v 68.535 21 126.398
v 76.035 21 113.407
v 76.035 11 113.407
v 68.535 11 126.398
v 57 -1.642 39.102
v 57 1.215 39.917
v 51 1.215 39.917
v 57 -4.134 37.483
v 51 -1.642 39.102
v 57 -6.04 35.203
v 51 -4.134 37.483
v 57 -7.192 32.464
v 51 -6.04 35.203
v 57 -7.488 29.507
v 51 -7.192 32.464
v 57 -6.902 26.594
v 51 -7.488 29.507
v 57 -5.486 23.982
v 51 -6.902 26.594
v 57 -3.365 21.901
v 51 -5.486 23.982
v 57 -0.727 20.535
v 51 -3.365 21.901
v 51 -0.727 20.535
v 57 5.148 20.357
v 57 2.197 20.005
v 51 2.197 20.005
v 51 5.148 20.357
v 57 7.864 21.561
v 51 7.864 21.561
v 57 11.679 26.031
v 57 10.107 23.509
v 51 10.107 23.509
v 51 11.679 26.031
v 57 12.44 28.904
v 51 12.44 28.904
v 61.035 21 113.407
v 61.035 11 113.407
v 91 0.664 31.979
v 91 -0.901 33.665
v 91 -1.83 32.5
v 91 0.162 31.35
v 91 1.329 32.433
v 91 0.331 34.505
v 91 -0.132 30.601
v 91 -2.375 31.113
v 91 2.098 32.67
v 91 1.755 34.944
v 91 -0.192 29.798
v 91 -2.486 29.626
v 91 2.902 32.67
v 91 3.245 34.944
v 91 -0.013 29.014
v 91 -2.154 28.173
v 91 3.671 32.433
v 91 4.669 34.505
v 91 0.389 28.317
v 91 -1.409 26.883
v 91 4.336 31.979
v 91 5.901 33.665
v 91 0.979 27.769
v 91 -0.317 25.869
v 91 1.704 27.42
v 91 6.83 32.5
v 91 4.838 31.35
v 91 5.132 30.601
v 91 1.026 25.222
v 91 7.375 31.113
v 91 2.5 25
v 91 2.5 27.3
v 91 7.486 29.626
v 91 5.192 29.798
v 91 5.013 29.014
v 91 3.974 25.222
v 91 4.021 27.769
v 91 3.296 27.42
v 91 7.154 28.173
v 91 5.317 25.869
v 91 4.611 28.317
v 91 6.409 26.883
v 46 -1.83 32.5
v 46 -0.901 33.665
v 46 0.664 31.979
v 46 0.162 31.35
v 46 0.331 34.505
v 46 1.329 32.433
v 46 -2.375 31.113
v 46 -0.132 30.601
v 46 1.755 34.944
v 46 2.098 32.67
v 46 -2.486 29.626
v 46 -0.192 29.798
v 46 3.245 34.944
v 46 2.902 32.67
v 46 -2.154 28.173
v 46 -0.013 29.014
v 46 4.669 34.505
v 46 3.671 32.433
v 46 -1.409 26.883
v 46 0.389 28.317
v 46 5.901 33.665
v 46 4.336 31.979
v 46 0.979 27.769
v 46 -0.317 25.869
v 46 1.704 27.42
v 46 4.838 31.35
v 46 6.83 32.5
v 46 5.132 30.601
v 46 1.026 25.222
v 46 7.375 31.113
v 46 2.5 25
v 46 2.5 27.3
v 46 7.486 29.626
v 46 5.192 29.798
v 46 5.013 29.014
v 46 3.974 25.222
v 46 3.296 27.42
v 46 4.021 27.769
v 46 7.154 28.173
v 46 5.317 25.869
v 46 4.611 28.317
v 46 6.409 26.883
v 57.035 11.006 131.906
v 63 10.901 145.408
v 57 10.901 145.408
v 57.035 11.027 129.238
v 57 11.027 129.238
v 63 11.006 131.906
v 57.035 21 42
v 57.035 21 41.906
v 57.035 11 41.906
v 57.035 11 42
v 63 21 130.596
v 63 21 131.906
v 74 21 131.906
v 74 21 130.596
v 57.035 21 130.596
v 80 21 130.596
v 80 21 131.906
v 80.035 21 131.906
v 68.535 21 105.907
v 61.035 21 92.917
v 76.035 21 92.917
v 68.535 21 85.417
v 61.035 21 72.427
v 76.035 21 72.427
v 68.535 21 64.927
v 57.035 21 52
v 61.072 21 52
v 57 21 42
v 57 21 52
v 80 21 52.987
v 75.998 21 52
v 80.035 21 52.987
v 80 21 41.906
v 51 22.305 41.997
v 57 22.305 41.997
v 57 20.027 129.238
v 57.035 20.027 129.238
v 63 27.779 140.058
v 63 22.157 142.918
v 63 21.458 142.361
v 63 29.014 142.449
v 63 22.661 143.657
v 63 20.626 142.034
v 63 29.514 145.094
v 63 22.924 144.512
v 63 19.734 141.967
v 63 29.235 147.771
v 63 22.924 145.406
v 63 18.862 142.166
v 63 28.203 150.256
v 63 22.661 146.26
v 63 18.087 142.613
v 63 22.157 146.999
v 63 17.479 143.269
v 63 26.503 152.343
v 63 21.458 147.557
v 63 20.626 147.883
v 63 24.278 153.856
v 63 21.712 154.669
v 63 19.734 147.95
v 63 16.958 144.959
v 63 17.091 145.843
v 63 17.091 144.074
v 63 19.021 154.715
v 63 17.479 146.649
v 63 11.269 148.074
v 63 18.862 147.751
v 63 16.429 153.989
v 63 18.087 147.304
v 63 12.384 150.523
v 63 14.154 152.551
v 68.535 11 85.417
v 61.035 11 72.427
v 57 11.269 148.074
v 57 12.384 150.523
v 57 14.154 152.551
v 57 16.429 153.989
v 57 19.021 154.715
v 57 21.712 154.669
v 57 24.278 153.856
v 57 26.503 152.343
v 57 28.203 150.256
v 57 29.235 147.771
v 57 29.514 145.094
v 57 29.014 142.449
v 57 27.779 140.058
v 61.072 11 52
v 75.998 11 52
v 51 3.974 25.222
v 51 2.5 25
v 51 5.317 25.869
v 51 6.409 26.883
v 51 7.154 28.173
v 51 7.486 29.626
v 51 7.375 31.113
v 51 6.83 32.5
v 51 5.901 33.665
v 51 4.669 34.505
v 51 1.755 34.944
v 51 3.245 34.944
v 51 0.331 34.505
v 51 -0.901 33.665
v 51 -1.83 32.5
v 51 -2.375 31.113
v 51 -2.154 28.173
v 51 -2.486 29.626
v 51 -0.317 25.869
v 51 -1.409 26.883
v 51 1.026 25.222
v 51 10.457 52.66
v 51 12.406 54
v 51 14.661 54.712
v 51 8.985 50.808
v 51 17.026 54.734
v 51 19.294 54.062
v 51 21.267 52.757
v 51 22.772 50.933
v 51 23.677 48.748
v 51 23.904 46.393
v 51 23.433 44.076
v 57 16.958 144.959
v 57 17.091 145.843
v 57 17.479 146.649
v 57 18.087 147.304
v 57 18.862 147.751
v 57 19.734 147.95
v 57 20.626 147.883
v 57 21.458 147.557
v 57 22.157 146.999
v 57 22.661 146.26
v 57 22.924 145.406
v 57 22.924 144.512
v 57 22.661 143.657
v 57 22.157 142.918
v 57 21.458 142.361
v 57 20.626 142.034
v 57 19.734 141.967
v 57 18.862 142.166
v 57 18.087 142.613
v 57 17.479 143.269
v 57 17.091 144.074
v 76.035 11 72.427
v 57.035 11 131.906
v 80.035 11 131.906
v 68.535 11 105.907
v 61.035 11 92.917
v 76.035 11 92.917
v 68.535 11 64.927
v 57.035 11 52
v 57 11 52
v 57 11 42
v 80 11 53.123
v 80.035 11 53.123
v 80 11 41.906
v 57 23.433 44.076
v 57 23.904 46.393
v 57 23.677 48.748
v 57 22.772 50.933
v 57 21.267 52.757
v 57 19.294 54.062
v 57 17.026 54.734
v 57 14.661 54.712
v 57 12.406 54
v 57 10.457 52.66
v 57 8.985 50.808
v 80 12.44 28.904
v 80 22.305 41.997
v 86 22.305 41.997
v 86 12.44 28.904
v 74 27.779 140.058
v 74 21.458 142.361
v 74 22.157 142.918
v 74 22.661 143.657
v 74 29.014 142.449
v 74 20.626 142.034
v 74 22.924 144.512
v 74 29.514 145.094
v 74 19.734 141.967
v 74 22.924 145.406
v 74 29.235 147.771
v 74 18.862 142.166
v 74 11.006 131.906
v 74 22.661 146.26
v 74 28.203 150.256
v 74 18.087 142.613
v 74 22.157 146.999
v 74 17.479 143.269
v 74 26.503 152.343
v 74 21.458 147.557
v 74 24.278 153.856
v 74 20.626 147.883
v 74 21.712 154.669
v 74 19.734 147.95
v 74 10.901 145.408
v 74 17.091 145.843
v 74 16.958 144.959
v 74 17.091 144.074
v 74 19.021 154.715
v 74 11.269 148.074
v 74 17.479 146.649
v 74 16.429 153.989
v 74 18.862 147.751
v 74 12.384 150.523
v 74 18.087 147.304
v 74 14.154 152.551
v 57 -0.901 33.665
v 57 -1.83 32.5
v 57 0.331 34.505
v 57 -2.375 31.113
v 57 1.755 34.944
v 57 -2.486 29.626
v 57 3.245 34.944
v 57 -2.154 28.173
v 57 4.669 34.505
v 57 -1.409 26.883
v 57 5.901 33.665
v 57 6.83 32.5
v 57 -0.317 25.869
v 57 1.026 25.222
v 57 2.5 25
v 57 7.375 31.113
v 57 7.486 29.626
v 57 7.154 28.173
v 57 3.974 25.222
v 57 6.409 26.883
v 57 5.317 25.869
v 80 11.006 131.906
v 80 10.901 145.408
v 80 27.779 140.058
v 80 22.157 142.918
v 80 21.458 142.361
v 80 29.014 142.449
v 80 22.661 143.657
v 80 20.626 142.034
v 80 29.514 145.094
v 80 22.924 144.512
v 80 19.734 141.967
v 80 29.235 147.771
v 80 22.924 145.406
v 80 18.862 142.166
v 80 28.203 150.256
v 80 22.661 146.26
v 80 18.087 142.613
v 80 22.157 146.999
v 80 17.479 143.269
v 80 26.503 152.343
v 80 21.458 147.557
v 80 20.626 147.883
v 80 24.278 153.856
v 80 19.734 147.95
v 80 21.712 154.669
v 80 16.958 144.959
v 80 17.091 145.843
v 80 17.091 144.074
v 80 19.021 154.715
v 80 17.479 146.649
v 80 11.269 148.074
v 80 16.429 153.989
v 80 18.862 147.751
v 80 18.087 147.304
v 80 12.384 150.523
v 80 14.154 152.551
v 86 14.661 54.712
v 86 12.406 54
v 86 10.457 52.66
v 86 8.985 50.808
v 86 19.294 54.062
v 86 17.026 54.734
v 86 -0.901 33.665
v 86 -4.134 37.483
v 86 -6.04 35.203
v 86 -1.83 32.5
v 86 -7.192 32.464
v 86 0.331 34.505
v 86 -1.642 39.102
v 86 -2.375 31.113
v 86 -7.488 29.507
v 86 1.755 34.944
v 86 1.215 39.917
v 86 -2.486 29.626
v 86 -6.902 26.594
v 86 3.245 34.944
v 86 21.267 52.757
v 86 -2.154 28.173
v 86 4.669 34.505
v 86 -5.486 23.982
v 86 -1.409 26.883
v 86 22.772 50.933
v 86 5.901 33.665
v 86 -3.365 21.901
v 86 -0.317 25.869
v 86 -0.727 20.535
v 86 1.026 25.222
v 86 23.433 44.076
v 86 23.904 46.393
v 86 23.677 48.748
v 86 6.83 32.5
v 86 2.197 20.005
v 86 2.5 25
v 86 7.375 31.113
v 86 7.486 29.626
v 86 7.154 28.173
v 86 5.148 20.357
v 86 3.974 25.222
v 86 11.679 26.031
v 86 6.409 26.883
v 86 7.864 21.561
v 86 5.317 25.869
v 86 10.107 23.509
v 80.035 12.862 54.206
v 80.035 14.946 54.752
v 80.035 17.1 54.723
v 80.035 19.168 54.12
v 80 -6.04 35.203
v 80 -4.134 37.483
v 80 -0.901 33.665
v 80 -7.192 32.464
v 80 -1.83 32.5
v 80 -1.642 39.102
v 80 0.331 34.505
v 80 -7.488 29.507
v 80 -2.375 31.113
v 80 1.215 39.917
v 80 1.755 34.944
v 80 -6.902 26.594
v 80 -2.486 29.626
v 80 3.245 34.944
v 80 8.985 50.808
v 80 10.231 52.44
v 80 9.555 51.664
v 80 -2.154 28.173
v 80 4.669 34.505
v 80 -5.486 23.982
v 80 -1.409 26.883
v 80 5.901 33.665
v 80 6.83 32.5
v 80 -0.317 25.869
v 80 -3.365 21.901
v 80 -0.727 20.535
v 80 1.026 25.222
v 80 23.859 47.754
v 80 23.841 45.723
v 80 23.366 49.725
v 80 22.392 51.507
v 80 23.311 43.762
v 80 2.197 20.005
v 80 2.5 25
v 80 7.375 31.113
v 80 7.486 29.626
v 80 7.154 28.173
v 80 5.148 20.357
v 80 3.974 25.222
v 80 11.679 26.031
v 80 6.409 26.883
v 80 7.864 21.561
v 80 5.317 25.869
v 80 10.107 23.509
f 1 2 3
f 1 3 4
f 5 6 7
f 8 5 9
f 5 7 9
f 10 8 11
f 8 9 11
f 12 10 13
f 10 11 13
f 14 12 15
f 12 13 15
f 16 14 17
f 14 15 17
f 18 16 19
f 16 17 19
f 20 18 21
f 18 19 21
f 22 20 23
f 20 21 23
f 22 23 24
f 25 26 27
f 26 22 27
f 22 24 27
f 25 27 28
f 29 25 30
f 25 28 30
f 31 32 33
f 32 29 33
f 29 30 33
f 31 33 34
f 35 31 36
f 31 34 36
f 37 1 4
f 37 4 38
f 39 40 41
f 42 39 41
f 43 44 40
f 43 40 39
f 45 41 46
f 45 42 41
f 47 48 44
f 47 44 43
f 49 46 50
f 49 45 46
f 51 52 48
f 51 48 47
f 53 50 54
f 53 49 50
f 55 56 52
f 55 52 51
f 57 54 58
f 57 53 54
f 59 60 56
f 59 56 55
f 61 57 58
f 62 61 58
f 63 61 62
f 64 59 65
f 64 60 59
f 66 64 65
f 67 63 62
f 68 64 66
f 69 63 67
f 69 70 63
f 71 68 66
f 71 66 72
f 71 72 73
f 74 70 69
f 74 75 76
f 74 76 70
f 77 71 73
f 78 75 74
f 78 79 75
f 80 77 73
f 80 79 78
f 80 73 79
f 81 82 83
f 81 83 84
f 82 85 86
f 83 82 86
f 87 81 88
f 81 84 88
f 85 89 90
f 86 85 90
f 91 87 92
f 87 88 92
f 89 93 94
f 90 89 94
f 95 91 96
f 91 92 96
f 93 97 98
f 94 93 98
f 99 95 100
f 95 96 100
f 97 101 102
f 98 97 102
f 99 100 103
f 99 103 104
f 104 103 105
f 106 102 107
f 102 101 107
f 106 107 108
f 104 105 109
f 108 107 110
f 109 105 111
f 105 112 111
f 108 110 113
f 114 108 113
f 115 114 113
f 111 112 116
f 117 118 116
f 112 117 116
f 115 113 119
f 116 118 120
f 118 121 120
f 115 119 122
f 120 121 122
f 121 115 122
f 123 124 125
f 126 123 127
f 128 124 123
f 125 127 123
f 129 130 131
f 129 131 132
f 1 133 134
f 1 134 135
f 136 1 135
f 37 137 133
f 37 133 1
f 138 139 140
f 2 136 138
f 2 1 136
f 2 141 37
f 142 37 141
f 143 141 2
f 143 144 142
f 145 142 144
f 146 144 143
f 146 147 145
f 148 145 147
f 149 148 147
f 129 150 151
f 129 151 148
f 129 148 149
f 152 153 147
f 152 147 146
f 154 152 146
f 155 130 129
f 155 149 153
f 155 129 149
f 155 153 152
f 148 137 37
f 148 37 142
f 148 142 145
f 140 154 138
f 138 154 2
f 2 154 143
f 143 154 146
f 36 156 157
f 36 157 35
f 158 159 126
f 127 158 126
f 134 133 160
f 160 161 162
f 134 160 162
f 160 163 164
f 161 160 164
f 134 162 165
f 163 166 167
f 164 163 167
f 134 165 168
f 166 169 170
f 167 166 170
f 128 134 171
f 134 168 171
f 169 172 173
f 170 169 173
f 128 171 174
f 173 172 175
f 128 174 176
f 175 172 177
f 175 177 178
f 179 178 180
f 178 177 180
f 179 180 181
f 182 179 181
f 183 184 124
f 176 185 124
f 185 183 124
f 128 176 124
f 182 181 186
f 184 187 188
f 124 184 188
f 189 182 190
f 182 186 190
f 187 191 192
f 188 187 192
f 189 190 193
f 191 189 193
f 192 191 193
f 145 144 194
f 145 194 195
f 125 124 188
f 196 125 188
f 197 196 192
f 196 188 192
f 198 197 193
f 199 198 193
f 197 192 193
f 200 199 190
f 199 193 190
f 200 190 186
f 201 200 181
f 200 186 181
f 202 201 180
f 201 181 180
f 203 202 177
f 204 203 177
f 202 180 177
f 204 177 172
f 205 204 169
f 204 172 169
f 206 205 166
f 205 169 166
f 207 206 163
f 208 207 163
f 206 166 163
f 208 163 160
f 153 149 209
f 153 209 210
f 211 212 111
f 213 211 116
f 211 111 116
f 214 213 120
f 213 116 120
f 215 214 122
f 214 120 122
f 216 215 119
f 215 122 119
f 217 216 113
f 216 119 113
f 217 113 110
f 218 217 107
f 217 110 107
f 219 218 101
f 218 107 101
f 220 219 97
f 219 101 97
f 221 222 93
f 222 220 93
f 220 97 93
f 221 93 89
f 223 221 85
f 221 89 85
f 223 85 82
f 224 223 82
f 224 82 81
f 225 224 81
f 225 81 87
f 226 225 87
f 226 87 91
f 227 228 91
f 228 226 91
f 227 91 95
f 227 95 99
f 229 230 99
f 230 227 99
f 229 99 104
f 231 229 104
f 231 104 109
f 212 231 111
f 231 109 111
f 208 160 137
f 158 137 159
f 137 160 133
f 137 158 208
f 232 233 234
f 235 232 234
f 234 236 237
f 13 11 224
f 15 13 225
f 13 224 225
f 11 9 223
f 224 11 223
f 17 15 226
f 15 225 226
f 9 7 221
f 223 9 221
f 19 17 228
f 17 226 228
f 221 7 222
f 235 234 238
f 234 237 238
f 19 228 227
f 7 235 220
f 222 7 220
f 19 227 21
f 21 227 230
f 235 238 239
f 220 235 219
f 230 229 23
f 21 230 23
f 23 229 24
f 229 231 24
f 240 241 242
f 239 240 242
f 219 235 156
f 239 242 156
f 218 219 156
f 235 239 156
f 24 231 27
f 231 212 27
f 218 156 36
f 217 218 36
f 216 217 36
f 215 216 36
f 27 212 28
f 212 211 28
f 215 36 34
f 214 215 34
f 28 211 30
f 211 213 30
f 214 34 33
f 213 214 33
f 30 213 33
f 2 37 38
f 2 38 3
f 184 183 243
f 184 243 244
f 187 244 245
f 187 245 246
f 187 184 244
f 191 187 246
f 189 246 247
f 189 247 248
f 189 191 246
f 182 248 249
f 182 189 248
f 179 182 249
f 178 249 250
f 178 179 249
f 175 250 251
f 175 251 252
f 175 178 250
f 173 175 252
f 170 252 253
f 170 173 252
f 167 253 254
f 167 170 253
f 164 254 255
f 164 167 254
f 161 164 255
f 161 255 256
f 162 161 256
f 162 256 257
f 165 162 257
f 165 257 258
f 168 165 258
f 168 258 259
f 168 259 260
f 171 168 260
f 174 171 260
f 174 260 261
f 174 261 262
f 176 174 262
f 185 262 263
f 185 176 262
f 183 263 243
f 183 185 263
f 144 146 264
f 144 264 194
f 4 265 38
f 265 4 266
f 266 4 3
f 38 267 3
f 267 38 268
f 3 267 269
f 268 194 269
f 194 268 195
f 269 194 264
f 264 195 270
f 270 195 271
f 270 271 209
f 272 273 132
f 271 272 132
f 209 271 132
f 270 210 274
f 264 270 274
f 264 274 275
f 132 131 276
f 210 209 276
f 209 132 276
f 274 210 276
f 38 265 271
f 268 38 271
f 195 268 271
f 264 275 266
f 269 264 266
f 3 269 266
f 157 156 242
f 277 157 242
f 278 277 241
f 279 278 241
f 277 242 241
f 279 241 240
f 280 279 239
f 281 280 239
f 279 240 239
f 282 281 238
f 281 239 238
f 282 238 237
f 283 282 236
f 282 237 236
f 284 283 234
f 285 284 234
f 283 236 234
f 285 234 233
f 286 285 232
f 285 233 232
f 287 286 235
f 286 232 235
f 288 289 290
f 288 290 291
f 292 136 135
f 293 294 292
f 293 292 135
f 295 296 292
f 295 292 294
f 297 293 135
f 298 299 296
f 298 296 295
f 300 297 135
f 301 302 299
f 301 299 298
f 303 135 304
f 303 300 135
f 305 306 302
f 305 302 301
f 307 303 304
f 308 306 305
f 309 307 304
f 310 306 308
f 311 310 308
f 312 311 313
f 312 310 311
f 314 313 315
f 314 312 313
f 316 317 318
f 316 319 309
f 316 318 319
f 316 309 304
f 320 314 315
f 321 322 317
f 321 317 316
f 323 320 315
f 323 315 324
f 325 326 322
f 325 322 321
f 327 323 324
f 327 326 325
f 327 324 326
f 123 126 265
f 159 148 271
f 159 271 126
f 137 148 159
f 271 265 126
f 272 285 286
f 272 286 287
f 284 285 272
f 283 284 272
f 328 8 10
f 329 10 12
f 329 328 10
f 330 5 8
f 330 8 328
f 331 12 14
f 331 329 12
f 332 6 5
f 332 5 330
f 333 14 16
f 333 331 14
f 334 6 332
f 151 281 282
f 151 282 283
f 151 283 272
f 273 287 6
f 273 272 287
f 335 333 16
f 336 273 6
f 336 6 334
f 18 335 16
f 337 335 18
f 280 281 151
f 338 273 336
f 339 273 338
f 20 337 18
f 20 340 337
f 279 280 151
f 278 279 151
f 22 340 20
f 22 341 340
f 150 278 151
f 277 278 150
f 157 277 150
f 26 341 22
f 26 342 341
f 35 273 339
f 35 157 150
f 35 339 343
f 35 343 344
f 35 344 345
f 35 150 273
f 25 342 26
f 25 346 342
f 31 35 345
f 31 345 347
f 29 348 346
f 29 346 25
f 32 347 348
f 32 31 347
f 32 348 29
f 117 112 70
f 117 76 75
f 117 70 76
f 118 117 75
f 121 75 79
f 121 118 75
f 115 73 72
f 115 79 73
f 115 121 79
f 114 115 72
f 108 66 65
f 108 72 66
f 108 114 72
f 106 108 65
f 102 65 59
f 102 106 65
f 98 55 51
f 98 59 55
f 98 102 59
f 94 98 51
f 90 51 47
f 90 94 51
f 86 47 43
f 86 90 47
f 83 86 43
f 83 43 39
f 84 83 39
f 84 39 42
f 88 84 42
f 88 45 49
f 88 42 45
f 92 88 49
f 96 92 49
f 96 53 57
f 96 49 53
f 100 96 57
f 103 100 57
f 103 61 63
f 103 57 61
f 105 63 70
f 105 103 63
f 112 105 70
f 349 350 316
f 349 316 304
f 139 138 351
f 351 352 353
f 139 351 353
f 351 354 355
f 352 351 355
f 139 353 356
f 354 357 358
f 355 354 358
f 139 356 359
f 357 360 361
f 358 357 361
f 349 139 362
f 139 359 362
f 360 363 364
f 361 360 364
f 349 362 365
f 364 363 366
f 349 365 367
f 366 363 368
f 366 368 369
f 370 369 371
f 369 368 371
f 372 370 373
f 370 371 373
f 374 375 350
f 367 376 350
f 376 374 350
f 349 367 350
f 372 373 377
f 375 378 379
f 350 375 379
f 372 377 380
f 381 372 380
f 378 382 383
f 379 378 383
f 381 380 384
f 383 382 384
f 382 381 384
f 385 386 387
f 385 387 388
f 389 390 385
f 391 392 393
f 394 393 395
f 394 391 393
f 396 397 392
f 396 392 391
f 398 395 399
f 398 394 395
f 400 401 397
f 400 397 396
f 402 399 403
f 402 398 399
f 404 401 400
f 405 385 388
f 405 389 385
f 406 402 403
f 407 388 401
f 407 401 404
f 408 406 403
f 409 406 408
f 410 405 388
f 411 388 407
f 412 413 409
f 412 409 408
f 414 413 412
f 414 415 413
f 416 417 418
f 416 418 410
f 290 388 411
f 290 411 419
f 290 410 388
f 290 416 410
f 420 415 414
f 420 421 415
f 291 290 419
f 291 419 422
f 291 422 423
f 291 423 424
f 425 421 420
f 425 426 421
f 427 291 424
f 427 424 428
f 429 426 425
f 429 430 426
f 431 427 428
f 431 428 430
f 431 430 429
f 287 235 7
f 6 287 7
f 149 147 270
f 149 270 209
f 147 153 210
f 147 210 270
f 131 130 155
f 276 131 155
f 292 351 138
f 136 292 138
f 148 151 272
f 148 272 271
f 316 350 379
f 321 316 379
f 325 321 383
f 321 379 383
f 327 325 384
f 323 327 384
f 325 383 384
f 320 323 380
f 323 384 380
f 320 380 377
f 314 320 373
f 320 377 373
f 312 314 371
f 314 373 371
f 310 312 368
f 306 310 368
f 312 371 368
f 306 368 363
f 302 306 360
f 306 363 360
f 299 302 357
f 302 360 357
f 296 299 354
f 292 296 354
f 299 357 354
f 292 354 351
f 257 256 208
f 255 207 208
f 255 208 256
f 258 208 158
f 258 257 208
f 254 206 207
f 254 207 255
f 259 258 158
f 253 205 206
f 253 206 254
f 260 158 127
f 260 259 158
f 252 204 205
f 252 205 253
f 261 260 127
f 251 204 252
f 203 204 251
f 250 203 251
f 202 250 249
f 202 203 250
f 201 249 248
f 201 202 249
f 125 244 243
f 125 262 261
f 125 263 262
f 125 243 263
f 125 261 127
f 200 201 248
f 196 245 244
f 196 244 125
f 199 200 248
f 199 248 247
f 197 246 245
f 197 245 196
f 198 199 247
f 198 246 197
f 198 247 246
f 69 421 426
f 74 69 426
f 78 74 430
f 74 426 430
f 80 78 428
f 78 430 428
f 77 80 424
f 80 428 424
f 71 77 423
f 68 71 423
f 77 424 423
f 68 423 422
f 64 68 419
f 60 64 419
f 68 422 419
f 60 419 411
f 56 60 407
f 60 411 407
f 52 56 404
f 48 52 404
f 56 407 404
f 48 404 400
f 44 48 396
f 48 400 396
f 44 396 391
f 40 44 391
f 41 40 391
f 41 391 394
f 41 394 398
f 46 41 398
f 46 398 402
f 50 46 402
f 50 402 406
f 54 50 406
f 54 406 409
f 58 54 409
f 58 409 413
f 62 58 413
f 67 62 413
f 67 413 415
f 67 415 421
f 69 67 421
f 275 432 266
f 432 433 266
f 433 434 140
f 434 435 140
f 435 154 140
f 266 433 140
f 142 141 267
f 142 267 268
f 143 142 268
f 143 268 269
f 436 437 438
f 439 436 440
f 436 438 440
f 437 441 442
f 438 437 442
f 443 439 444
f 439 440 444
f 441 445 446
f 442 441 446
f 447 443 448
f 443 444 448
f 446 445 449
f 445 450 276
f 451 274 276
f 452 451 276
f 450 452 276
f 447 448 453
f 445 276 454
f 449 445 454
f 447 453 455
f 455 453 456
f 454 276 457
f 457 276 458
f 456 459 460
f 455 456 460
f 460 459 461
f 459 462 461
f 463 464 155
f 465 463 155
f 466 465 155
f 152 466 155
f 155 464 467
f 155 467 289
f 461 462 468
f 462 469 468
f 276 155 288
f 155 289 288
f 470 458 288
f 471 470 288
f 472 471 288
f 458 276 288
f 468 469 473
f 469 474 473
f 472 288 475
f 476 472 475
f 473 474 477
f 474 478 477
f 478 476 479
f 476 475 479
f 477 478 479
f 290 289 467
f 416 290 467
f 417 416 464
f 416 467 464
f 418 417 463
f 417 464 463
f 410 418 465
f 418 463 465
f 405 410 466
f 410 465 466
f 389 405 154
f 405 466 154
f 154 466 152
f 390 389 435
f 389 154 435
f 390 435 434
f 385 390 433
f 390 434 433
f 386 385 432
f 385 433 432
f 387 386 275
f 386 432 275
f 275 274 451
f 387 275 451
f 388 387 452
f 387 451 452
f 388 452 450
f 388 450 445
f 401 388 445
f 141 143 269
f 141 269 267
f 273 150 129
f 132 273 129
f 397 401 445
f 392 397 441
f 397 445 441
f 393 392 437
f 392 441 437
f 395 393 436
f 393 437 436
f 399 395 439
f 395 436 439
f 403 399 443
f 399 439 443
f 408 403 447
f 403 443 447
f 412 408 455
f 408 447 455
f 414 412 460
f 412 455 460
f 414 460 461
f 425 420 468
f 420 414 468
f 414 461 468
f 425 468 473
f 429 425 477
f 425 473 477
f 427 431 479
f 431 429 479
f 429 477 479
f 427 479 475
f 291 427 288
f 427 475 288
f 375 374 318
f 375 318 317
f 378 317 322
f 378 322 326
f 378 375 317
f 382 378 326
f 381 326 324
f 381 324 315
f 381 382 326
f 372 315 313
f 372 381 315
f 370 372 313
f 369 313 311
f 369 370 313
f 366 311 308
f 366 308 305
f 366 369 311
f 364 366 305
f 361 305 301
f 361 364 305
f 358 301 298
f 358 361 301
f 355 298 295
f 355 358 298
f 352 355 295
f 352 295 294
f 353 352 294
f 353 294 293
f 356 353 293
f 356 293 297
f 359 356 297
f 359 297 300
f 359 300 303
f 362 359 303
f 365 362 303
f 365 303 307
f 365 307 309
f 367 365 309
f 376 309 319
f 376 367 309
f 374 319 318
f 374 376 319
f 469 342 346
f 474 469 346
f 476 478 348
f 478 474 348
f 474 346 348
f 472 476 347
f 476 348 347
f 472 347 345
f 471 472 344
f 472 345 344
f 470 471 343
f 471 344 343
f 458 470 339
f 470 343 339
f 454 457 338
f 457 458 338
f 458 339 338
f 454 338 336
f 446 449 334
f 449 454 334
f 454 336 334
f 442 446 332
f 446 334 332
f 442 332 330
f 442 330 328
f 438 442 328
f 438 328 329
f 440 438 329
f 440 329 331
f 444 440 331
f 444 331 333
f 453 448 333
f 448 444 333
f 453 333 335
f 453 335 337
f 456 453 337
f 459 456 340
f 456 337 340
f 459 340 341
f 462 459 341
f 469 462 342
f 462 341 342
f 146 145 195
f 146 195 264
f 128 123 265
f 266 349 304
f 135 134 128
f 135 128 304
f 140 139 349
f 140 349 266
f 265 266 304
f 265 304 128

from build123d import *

# Parameters (mm, degrees)
SKETCH017_R       = 3
EXTRUDE016_DEPTH  = 6
SKETCH016_W       = 23
SKETCH016_H       = 90
EXTRUDE015_DEPTH  = 10
CYLINDER018_R     = 3
CYLINDER018_DEPTH = 25
CYLINDER013_R     = 7
CYLINDER013_DEPTH = 30
CYLINDER012_R     = 10
CYLINDER012_DEPTH = 6
EXTRUDE001_DEPTH  = 6
BOX022_W          = 23
BOX022_H          = 10
BOX022_DEPTH      = 10
CYLINDER021_R     = 2.7
CYLINDER021_DEPTH = 50
CYLINDER020_R     = 5
CYLINDER020_DEPTH = 45


with BuildPart() as union_brazo_central002:
    # Sketch017 → Extrude016 (new body)
    with BuildSketch(Plane(origin=(0, 0, 0), x_dir=(0, -1, 0), z_dir=(-1, 0, 0))):
        with BuildLine():
            ThreePointArc((-10.900695, 145.407872), (-23.024313, 154.355924), (-27.779278, 140.057671))
            Line((-27.779278, 140.057671), (-20.026942, 129.238365))
            Line((-20.026942, 129.238365), (-11.026942, 129.238365))
            Line((-10.900695, 145.407872), (-11.026942, 129.238365))
        make_face()
        with Locations((-19.957954, 144.958669)):
            Circle(SKETCH017_R, mode=Mode.SUBTRACT)
    extrude(amount=EXTRUDE016_DEPTH)


with BuildPart() as union_brazo_central002_1:
    # Extrude016 placement: moved
    add(union_brazo_central002.part.moved(Location((63, 0, 0))))


with BuildPart() as palo_central:
    # Sketch016 → Extrude015 (new body)
    with BuildSketch(Plane.XZ):
        with Locations((68.535034, 86.905613)):
            Rectangle(SKETCH016_W, SKETCH016_H)
        Polygon((68.535034, 64.926588), (61.035034, 51.936207), (76.035034, 51.936207), align=None, mode=Mode.SUBTRACT)
        Polygon((68.535034, 85.416969), (61.035034, 72.426588), (76.035034, 72.426588), align=None, mode=Mode.SUBTRACT)
        Polygon((68.535034, 105.90735), (61.035034, 92.916969), (76.035034, 92.916969), align=None, mode=Mode.SUBTRACT)
        Polygon((68.535034, 126.397731), (61.035034, 113.40735), (76.035034, 113.40735), align=None, mode=Mode.SUBTRACT)
    extrude(amount=EXTRUDE015_DEPTH)


with BuildPart() as palo_central_1:
    # Extrude015 placement: moved
    add(palo_central.part.moved(Location((0, 21, 0))))


with BuildPart() as rotor008:
    # Cylinder018 → Cylinder018 (new body)
    with BuildSketch(Plane(origin=(40, 2.5, 30), x_dir=(0, 0, -1), z_dir=(1, 0, 0))):
        Circle(CYLINDER018_R)
    extrude(amount=CYLINDER018_DEPTH)


with BuildPart() as rotor003:
    # Cylinder013 → Cylinder013 (new body)
    with BuildSketch(Plane(origin=(63, 2.5, 30), x_dir=(0, 0, -1), z_dir=(1, 0, 0))):
        Circle(CYLINDER013_R)
    extrude(amount=CYLINDER013_DEPTH)


with BuildPart() as union_motor_izq:
    # Cylinder012 → Cylinder012 (new body)
    with BuildSketch(Plane(origin=(54, 2.5, 30), x_dir=(0, 0, -1), z_dir=(1, 0, 0))):
        Circle(CYLINDER012_R)
    extrude(amount=CYLINDER012_DEPTH)

    # Cut008: cut Rotor003
    add(rotor003.part, mode=Mode.SUBTRACT)

    # Cut011: cut Rotor008
    add(rotor008.part, mode=Mode.SUBTRACT)


with BuildPart() as union_motor_centro:
    # Sketch001 → Extrude001 (new body)
    with BuildSketch(Plane.YZ):
        with BuildLine():
            ThreePointArc((22.654639, 41.99706), (20.679007, 53.483206), (9.335322, 50.808228))
            Line((9.335322, 50.808228), (1.552816, 39.899855))
            ThreePointArc((12.665635, 28.738862), (9.310536, 36.511168), (1.552816, 39.899855))
            Line((22.654639, 41.99706), (12.665635, 28.738862))
        make_face()
    extrude(amount=EXTRUDE001_DEPTH)


with BuildPart() as union_motor_centro_1:
    # Extrude001 placement: moved
    add(union_motor_centro.part.moved(Location((54, -0.35, 0))))

    # Fusion013: union Union motor izq
    add(union_motor_izq.part)


with BuildPart() as union_motor_centro001:
    # Link016 base: copy of Union motor centro
    add(union_motor_centro_1.part)


with BuildPart() as union_motor_centro001_1:
    # Link016 placement: moved
    add(union_motor_centro001.part.moved(Location((28.999998, -3e-06, 0))))


with BuildPart() as puente_centro:
    # Box022 → Box022 (new body)
    with BuildSketch(Plane(origin=(60, 11, 42), x_dir=(1, 0, 0), z_dir=(0, 0, 1))):
        with Locations((11.5, 5)):
            Rectangle(BOX022_W, BOX022_H)
    extrude(amount=BOX022_DEPTH)


with BuildPart() as hueco_rotor:
    # Cylinder021 → Cylinder021 (new body)
    with BuildSketch(Plane(origin=(37, 2.5, 30), x_dir=(0, 0, -1), z_dir=(1, 0, 0))):
        Circle(CYLINDER021_R)
    extrude(amount=CYLINDER021_DEPTH)


with BuildPart() as union_rotor_brazo:
    # Cylinder020 → Cylinder020 (new body)
    with BuildSketch(Plane(origin=(40, 2.5, 30), x_dir=(0, 0, -1), z_dir=(1, 0, 0))):
        Circle(CYLINDER020_R)
    extrude(amount=CYLINDER020_DEPTH)

    # Cut012: cut hueco rotor
    add(hueco_rotor.part, mode=Mode.SUBTRACT)


with BuildPart() as union_rotor_brazo_1:
    # Cut012 placement: moved
    add(union_rotor_brazo.part.moved(Location((9, 0, 0))))

    # Fusion014: union Union motor centro001, Union motor centro, Puente centro
    add(union_motor_centro001_1.part)
    add(union_motor_centro_1.part)
    add(puente_centro.part)


with BuildPart() as union_rotor_brazo_2:
    # Fusion014 placement: moved
    add(union_rotor_brazo_1.part.moved(Location((-3, 0, 0))))


with BuildPart() as brazo_central_v2:
    # Link018 base: copy of Union brazo central002
    add(union_brazo_central002_1.part)


with BuildPart() as brazo_central_v2_1:
    # Link018 placement: moved
    add(brazo_central_v2.part.moved(Location((17.000008, -1e-05, 0))))

    # Fusion022: union Union brazo central002, Palo central, Union rotor brazo
    add(union_brazo_central002_1.part)
    add(palo_central_1.part)
    add(union_rotor_brazo_2.part)


solid = brazo_central_v2_1.part
